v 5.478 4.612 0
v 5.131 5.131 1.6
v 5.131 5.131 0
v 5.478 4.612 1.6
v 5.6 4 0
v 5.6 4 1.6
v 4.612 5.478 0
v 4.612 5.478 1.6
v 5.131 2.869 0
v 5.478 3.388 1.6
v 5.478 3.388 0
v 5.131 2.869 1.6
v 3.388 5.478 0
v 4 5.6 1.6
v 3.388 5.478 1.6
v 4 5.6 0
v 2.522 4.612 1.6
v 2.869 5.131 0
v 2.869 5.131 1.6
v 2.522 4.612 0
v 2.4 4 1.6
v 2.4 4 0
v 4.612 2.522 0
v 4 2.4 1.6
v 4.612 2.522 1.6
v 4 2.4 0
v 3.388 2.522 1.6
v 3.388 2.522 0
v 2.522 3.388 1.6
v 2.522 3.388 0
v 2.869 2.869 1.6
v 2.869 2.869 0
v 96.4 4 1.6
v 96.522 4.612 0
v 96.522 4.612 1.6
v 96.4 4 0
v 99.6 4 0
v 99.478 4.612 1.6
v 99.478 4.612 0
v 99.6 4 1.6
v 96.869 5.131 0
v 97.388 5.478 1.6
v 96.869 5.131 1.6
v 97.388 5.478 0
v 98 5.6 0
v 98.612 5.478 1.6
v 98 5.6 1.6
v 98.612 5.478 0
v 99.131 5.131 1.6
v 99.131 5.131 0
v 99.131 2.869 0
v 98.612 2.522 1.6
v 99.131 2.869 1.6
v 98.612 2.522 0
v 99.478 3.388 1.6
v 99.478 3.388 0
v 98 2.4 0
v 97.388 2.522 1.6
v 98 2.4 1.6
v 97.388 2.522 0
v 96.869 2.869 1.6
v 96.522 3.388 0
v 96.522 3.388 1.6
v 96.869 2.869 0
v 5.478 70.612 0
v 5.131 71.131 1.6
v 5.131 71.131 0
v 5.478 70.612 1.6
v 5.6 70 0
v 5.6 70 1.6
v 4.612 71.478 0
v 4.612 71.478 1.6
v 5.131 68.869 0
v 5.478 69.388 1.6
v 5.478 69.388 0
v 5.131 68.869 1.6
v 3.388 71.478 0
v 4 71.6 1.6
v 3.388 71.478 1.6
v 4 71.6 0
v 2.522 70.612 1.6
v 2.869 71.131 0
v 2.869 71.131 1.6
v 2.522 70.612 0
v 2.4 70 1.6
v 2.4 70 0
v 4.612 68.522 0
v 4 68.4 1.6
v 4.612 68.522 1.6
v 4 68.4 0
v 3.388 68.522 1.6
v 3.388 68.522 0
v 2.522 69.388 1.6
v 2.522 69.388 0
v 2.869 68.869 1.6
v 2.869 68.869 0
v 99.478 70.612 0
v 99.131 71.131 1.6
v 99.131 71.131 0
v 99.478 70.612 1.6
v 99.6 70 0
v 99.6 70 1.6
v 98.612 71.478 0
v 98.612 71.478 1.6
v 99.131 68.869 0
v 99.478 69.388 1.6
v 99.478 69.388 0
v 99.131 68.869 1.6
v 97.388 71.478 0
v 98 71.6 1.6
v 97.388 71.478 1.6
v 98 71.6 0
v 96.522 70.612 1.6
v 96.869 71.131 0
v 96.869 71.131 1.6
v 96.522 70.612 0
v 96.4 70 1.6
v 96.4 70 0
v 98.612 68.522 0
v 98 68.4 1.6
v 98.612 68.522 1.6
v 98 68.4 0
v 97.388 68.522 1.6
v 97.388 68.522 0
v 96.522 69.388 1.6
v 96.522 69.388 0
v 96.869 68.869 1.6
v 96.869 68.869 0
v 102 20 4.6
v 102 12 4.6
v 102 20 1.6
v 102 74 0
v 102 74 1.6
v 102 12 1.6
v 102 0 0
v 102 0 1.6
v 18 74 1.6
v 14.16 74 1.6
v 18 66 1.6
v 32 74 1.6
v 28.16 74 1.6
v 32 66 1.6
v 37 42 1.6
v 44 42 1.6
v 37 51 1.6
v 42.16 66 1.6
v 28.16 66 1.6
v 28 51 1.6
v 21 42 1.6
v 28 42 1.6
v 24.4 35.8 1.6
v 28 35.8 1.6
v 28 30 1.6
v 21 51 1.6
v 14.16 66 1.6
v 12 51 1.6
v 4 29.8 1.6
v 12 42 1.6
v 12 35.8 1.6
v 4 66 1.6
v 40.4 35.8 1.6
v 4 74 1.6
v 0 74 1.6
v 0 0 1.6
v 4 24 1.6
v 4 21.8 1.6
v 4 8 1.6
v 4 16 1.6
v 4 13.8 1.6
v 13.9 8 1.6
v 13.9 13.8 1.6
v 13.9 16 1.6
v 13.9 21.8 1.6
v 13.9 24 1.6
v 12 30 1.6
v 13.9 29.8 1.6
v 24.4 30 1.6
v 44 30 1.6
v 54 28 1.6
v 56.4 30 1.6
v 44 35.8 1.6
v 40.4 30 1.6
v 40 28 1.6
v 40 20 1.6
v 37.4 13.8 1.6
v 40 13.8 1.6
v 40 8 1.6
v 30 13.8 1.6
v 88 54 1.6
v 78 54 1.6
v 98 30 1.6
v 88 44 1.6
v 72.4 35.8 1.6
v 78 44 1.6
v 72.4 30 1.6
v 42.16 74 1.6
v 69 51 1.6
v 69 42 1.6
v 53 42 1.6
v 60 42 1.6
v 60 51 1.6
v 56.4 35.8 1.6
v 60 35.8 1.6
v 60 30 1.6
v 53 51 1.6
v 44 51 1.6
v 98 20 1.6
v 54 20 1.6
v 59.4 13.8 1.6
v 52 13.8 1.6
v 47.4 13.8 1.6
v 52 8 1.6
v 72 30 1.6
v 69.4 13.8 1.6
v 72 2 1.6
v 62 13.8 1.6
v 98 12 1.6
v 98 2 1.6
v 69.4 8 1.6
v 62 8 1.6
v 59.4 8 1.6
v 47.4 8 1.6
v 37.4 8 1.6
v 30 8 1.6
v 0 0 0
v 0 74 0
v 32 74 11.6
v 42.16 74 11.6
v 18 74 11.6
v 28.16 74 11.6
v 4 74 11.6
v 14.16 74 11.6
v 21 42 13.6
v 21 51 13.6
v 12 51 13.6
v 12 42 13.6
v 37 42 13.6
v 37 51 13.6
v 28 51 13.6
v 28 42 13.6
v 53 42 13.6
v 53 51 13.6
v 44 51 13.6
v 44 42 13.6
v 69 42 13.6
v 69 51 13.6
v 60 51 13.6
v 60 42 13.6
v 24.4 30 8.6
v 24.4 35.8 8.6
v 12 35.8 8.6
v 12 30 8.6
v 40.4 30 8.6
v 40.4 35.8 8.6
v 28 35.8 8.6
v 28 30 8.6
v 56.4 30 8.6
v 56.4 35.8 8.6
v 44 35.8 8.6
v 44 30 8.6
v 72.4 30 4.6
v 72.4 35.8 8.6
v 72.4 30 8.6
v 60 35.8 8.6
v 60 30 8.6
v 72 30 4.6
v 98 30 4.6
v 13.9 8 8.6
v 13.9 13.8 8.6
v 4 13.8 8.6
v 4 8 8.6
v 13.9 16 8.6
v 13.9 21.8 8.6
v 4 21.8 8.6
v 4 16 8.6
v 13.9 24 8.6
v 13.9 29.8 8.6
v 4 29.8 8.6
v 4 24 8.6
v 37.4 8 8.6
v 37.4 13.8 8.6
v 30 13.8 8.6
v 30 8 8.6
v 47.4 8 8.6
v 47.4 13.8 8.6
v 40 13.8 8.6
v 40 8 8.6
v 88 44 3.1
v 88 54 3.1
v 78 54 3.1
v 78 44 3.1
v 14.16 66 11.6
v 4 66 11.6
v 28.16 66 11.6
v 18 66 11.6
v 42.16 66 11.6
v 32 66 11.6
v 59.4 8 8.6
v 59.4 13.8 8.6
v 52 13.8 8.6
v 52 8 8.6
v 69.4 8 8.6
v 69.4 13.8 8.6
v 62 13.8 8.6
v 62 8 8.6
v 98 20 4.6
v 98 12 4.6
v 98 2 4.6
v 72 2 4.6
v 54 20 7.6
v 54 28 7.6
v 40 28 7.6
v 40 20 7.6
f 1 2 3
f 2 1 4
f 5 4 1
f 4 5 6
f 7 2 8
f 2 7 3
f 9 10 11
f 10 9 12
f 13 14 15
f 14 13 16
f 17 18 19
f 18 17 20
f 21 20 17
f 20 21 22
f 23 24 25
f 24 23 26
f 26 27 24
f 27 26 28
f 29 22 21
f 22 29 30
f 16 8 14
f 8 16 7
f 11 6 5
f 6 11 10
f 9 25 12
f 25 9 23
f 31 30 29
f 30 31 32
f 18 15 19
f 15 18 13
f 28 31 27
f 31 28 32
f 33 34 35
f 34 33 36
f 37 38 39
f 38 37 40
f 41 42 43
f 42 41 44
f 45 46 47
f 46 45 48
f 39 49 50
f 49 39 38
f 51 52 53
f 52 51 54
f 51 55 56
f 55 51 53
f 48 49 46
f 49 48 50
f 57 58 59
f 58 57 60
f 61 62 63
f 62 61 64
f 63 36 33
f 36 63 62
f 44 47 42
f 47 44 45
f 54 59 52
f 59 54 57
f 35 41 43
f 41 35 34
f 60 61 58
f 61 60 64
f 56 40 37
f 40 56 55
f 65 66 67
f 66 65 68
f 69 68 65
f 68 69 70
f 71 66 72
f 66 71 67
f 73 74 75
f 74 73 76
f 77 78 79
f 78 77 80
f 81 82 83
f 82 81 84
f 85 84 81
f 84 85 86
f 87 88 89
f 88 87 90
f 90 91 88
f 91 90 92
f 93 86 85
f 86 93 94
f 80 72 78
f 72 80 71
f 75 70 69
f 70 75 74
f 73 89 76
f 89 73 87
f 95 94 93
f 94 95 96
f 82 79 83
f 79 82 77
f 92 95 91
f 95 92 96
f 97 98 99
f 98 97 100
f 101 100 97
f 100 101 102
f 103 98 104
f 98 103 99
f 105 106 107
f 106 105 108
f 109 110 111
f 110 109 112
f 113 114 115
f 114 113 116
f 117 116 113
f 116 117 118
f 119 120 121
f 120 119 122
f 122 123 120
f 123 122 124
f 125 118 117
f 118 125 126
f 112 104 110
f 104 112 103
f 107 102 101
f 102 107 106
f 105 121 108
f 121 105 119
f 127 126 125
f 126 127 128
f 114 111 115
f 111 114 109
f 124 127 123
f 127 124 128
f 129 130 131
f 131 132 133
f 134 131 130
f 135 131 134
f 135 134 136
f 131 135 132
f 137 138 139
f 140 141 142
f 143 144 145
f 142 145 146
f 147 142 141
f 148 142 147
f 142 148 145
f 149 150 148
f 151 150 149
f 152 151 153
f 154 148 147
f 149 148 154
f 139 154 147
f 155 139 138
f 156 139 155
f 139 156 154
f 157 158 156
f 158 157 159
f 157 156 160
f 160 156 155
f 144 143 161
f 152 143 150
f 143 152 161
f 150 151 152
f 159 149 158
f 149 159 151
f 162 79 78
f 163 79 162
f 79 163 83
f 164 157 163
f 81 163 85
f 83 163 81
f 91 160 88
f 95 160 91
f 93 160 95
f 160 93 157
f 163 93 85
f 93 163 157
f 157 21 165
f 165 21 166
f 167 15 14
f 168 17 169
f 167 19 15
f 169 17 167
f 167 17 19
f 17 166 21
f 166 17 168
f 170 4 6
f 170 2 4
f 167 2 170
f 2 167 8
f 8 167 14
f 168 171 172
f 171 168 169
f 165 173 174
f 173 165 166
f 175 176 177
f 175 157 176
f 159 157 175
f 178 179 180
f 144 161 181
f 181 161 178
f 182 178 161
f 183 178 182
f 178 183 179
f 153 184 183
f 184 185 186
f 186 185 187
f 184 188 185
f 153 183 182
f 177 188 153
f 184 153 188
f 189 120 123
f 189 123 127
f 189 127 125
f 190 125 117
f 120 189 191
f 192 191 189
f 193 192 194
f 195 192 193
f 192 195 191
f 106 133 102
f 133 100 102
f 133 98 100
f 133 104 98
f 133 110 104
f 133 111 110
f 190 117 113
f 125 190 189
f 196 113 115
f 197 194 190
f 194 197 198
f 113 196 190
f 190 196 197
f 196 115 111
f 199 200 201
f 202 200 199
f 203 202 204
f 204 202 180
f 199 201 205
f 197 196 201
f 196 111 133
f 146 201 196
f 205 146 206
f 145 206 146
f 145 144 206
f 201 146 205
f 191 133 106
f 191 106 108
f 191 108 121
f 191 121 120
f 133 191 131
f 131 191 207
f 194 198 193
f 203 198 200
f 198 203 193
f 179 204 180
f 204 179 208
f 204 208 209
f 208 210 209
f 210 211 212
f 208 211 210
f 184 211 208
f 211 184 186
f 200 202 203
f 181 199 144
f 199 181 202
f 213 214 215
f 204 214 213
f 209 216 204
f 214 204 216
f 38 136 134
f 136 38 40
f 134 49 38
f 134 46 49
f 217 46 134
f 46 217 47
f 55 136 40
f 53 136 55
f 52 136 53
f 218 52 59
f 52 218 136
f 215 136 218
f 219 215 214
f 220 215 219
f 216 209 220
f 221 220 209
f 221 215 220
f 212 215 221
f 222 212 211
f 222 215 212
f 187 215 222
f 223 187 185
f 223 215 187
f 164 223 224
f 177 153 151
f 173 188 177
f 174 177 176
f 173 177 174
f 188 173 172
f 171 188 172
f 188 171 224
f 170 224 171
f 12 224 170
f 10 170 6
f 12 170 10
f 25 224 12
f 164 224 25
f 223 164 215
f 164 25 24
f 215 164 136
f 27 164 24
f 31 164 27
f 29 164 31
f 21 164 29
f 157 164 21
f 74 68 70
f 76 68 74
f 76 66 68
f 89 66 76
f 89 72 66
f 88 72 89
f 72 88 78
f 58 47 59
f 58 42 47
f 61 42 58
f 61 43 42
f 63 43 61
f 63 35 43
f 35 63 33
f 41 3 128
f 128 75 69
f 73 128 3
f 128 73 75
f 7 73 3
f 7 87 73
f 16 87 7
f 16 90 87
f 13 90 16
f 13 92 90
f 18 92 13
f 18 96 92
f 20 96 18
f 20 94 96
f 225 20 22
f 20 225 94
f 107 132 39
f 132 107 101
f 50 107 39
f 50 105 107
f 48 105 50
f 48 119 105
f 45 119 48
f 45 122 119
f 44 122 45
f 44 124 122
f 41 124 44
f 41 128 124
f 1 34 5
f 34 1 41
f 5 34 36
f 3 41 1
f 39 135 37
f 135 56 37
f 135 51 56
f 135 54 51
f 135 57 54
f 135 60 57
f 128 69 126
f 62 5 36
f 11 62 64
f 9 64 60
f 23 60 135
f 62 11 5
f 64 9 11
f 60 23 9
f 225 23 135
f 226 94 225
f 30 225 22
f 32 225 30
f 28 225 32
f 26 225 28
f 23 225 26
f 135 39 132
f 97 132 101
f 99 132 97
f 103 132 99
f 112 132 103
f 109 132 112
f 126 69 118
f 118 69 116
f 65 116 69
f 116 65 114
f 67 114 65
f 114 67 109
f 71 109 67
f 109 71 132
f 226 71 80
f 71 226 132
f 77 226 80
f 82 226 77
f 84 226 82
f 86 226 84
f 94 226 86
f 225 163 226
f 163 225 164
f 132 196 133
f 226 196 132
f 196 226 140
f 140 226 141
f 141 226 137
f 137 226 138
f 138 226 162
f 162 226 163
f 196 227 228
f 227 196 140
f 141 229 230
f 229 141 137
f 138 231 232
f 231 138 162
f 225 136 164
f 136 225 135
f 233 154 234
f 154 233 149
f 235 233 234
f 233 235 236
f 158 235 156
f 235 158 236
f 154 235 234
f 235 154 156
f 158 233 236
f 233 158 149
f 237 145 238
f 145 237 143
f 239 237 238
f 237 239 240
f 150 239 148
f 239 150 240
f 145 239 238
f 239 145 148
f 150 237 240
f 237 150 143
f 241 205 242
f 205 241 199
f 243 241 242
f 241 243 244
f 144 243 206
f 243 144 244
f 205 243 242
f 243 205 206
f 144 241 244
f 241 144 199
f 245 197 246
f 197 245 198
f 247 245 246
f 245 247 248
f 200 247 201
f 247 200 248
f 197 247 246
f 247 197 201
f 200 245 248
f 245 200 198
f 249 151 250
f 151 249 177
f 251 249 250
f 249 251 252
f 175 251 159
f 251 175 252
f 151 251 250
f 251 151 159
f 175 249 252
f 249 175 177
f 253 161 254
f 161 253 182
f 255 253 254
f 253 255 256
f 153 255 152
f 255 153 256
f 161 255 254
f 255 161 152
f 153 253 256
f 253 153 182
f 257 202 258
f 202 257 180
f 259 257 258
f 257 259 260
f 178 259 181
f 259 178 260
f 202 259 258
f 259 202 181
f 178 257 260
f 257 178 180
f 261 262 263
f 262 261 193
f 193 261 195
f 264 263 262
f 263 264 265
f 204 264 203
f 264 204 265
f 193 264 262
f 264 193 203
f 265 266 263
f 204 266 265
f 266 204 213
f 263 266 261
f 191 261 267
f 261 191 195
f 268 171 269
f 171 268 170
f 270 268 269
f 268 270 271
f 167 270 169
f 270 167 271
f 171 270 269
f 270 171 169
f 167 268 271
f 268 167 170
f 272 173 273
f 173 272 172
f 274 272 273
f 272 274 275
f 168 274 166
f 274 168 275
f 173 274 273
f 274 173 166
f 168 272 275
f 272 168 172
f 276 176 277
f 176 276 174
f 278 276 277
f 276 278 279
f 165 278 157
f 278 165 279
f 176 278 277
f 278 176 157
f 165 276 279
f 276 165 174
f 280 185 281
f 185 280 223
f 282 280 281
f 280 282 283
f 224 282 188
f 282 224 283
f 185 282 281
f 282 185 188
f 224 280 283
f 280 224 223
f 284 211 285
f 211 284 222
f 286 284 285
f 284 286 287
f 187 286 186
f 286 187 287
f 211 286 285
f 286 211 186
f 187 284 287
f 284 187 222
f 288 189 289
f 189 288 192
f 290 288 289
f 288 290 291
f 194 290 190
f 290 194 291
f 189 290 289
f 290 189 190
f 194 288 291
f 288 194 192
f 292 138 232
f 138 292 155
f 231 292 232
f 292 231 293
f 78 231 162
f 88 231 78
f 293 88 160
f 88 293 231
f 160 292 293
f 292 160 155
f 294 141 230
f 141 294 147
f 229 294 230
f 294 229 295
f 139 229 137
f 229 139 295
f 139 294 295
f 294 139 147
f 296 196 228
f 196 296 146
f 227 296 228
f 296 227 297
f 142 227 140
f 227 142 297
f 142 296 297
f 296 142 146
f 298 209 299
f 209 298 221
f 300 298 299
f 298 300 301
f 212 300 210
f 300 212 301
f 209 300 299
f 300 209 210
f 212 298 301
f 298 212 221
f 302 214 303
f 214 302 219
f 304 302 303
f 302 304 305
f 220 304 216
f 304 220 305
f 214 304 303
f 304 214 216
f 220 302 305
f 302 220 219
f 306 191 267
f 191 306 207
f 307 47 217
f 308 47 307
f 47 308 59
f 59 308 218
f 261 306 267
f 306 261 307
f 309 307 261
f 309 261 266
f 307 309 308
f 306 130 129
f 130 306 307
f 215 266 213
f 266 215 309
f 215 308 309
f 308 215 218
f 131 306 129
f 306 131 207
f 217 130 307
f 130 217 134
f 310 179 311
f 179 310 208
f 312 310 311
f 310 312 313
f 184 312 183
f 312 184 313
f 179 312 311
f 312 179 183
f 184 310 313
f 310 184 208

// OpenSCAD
// file: ../board_common.scad
// What every board model here is made of: a PCB with holes, pin headers,
// chips and jacks, drawn from published dimensions. Nothing here is anyone's
// mesh; a board's outline, hole positions and connector placements are
// specifications the makers publish so that cases and shields can be made.
//
// Every board's origin is its PCB's front-left bottom corner (x right, y back,
// z up), with the PCB lying flat on z = 0 -- so a board placed at a node in
// a site sits on that node's floor, which is where a board sits on a bench.

pcb_t = 1.6;
pitch = 2.54;

module pcb(size, holes = [], hole_d = 3.2, col = "darkgreen") {
    color(col) difference() {
        cube([size.x, size.y, pcb_t]);
        for (h = holes) translate([h.x, h.y, -1]) cylinder(d = hole_d, h = pcb_t + 2, $fn = 16);
    }
}

// Pins are square posts that overlap what they stand in. OpenSCAD 2021.01
// exports a union with hexagonal pins, or with parts that only touch along
// an edge, as a mesh that is not closed -- and then drops it from any later
// union, silently. Every part here overlaps its neighbour by a little.
pin = 0.64;

// a row of `n` pins at the given start, along +x (or +y when `along_y`), with plastic bodies
module header(n, at, along_y = false, rows = 1, h = 8.5) {
    translate([at.x, at.y, pcb_t - 0.1]) rotate([0, 0, along_y ? 90 : 0]) translate([0, along_y ? -rows * pitch : 0, 0]) {
        color("black") cube([n * pitch, rows * pitch, h]);
        color("gold") for (i = [0 : n - 1]) for (r = [0 : rows - 1])
            translate([i * pitch + pitch / 2 - pin / 2, r * pitch + pitch / 2 - pin / 2, -3]) cube([pin, pin, h + 6]);
    }
}

// a row of `n` bare pins pointing down (a devkit standing on a breadboard).
// The pins are one gold strip, not n posts: n posts through a plastic bar
// under a PCB is a face with n holes, which OpenSCAD 2021.01 exports as a
// mesh CGAL will not read back. At bench scale a strip is a row of pins.
module pins_down(n, at, along_y = false, len = 11) {
    // one translate per solid, from the board's own frame: a chain of
    // translates with negative offsets rounds differently and the exporter
    // then writes a mesh CGAL will not read back (seen; not understood)
    rotate([0, 0, along_y ? 90 : 0]) {
        color("black") translate([at.x, at.y - pitch / 2, pcb_t - pitch]) cube([n * pitch, pitch, pitch + 0.1]);
        color("gold") translate([at.x + pitch / 2 - pin / 2, at.y - pin / 2, -len]) cube([(n - 1) * pitch + pin, pin, len + pcb_t - pitch + 0.2]);
    }
}

module chip(size, at, col = "black") { color(col) translate([at.x, at.y, pcb_t - 0.1]) cube([size.x, size.y, size.z + 0.1]); }

module usb_b(at) {           // a full-size USB-B jack, its face at the -x side
    color("silver") translate([at.x, at.y, pcb_t]) cube([16, 12, 11]);
}
module barrel_jack(at) {     // a 2.1 mm DC jack, its face at the -x side
    color("black") translate([at.x, at.y, pcb_t]) cube([14, 9, 11]);
}
module micro_usb(at, along_y = false) {
    color("silver") translate([at.x, at.y, pcb_t]) cube(along_y ? [8, 6, 3] : [6, 8, 3]);
}
module usb_c(at) { color("silver") translate([at.x, at.y, pcb_t]) cube([9, 7.5, 3.2]); }
module usb_a_stack(at) {     // two USB-A ports one above the other, the face at +x
    color("silver") translate([at.x, at.y, pcb_t]) cube([17.5, 13.2, 16]);
}
module rj45(at) { color("silver") translate([at.x, at.y, pcb_t]) cube([21.5, 16, 13.5]); }
module button(at) { color("silver") translate([at.x, at.y, pcb_t - 0.1]) cube([6, 6, 3.6]); color("black") translate([at.x + 1.5, at.y + 1.5, pcb_t + 3.4]) cube([3, 3, 1.1]); }
module crystal(at) { color("silver") translate([at.x, at.y, pcb_t]) cube([11, 4.5, 3.5]); }
module heatsink(at, size = [9, 9, 8]) { color("black") translate([at.x, at.y, pcb_t - 0.1]) cube([size.x, size.y, size.z + 4.1]); }
module screw_terminal(n, at, along_y = false) {
    translate([at.x, at.y, pcb_t]) rotate([0, 0, along_y ? 90 : 0]) color("mediumblue") cube([n * 5.08, 8, 10]);
}
module jst(n, at, along_y = false) {   // a JST-XH style header
    translate([at.x, at.y, pcb_t]) rotate([0, 0, along_y ? 90 : 0]) color("ivory") cube([n * 2.5 + 2.4, 5.8, 7]);
}
module sd_slot(at) { color("silver") translate([at.x, at.y, pcb_t]) cube([26, 28, 3]); }
// main file
// Creality V4.2.2 mainboard, the 32-bit board in an Ender 3's electronics
// box: a 102 x 74 mm PCB (the published footprint) with four TMC2208 stepper
// drivers under heatsinks, the STM32 MCU, the 24 V input and heater screw
// terminals along one edge, the endstop and fan headers along another, the
// SD card slot and the micro-USB jack at the front. The node a printer's
// serial port is pinned to.

include <../board_common.scad>

size = [102, 74];
holes = [[4, 4], [98, 4], [4, 70], [98, 70]];

module creality_v422() {
    pcb(size, holes, hole_d = 3.2, col = "midnightblue");
    for (i = [0 : 3]) heatsink([12 + i * 16, 42]);            // X, Y, Z, E drivers
    chip([10, 10, 1.5], [78, 44], "dimgray");                   // the STM32
    screw_terminal(2, [4, 66]);                                 // 24 V in
    screw_terminal(2, [18, 66]);                                // bed
    screw_terminal(2, [32, 66]);                                // hotend
    for (i = [0 : 3]) jst(4, [12 + i * 16, 30]);               // the steppers
    for (i = [0 : 2]) jst(3, [4, 8 + i * 8], along_y = false);  // endstops
    for (i = [0 : 1]) jst(2, [30 + i * 10, 8]);                // fans
    jst(2, [52, 8]); jst(2, [62, 8]);                          // thermistors
    sd_slot([72, 2]);
    micro_usb([96, 12], along_y = false);
    color("silver") translate([40, 20, pcb_t]) cube([14, 8, 6]);   // the buzzer
}

creality_v422();
